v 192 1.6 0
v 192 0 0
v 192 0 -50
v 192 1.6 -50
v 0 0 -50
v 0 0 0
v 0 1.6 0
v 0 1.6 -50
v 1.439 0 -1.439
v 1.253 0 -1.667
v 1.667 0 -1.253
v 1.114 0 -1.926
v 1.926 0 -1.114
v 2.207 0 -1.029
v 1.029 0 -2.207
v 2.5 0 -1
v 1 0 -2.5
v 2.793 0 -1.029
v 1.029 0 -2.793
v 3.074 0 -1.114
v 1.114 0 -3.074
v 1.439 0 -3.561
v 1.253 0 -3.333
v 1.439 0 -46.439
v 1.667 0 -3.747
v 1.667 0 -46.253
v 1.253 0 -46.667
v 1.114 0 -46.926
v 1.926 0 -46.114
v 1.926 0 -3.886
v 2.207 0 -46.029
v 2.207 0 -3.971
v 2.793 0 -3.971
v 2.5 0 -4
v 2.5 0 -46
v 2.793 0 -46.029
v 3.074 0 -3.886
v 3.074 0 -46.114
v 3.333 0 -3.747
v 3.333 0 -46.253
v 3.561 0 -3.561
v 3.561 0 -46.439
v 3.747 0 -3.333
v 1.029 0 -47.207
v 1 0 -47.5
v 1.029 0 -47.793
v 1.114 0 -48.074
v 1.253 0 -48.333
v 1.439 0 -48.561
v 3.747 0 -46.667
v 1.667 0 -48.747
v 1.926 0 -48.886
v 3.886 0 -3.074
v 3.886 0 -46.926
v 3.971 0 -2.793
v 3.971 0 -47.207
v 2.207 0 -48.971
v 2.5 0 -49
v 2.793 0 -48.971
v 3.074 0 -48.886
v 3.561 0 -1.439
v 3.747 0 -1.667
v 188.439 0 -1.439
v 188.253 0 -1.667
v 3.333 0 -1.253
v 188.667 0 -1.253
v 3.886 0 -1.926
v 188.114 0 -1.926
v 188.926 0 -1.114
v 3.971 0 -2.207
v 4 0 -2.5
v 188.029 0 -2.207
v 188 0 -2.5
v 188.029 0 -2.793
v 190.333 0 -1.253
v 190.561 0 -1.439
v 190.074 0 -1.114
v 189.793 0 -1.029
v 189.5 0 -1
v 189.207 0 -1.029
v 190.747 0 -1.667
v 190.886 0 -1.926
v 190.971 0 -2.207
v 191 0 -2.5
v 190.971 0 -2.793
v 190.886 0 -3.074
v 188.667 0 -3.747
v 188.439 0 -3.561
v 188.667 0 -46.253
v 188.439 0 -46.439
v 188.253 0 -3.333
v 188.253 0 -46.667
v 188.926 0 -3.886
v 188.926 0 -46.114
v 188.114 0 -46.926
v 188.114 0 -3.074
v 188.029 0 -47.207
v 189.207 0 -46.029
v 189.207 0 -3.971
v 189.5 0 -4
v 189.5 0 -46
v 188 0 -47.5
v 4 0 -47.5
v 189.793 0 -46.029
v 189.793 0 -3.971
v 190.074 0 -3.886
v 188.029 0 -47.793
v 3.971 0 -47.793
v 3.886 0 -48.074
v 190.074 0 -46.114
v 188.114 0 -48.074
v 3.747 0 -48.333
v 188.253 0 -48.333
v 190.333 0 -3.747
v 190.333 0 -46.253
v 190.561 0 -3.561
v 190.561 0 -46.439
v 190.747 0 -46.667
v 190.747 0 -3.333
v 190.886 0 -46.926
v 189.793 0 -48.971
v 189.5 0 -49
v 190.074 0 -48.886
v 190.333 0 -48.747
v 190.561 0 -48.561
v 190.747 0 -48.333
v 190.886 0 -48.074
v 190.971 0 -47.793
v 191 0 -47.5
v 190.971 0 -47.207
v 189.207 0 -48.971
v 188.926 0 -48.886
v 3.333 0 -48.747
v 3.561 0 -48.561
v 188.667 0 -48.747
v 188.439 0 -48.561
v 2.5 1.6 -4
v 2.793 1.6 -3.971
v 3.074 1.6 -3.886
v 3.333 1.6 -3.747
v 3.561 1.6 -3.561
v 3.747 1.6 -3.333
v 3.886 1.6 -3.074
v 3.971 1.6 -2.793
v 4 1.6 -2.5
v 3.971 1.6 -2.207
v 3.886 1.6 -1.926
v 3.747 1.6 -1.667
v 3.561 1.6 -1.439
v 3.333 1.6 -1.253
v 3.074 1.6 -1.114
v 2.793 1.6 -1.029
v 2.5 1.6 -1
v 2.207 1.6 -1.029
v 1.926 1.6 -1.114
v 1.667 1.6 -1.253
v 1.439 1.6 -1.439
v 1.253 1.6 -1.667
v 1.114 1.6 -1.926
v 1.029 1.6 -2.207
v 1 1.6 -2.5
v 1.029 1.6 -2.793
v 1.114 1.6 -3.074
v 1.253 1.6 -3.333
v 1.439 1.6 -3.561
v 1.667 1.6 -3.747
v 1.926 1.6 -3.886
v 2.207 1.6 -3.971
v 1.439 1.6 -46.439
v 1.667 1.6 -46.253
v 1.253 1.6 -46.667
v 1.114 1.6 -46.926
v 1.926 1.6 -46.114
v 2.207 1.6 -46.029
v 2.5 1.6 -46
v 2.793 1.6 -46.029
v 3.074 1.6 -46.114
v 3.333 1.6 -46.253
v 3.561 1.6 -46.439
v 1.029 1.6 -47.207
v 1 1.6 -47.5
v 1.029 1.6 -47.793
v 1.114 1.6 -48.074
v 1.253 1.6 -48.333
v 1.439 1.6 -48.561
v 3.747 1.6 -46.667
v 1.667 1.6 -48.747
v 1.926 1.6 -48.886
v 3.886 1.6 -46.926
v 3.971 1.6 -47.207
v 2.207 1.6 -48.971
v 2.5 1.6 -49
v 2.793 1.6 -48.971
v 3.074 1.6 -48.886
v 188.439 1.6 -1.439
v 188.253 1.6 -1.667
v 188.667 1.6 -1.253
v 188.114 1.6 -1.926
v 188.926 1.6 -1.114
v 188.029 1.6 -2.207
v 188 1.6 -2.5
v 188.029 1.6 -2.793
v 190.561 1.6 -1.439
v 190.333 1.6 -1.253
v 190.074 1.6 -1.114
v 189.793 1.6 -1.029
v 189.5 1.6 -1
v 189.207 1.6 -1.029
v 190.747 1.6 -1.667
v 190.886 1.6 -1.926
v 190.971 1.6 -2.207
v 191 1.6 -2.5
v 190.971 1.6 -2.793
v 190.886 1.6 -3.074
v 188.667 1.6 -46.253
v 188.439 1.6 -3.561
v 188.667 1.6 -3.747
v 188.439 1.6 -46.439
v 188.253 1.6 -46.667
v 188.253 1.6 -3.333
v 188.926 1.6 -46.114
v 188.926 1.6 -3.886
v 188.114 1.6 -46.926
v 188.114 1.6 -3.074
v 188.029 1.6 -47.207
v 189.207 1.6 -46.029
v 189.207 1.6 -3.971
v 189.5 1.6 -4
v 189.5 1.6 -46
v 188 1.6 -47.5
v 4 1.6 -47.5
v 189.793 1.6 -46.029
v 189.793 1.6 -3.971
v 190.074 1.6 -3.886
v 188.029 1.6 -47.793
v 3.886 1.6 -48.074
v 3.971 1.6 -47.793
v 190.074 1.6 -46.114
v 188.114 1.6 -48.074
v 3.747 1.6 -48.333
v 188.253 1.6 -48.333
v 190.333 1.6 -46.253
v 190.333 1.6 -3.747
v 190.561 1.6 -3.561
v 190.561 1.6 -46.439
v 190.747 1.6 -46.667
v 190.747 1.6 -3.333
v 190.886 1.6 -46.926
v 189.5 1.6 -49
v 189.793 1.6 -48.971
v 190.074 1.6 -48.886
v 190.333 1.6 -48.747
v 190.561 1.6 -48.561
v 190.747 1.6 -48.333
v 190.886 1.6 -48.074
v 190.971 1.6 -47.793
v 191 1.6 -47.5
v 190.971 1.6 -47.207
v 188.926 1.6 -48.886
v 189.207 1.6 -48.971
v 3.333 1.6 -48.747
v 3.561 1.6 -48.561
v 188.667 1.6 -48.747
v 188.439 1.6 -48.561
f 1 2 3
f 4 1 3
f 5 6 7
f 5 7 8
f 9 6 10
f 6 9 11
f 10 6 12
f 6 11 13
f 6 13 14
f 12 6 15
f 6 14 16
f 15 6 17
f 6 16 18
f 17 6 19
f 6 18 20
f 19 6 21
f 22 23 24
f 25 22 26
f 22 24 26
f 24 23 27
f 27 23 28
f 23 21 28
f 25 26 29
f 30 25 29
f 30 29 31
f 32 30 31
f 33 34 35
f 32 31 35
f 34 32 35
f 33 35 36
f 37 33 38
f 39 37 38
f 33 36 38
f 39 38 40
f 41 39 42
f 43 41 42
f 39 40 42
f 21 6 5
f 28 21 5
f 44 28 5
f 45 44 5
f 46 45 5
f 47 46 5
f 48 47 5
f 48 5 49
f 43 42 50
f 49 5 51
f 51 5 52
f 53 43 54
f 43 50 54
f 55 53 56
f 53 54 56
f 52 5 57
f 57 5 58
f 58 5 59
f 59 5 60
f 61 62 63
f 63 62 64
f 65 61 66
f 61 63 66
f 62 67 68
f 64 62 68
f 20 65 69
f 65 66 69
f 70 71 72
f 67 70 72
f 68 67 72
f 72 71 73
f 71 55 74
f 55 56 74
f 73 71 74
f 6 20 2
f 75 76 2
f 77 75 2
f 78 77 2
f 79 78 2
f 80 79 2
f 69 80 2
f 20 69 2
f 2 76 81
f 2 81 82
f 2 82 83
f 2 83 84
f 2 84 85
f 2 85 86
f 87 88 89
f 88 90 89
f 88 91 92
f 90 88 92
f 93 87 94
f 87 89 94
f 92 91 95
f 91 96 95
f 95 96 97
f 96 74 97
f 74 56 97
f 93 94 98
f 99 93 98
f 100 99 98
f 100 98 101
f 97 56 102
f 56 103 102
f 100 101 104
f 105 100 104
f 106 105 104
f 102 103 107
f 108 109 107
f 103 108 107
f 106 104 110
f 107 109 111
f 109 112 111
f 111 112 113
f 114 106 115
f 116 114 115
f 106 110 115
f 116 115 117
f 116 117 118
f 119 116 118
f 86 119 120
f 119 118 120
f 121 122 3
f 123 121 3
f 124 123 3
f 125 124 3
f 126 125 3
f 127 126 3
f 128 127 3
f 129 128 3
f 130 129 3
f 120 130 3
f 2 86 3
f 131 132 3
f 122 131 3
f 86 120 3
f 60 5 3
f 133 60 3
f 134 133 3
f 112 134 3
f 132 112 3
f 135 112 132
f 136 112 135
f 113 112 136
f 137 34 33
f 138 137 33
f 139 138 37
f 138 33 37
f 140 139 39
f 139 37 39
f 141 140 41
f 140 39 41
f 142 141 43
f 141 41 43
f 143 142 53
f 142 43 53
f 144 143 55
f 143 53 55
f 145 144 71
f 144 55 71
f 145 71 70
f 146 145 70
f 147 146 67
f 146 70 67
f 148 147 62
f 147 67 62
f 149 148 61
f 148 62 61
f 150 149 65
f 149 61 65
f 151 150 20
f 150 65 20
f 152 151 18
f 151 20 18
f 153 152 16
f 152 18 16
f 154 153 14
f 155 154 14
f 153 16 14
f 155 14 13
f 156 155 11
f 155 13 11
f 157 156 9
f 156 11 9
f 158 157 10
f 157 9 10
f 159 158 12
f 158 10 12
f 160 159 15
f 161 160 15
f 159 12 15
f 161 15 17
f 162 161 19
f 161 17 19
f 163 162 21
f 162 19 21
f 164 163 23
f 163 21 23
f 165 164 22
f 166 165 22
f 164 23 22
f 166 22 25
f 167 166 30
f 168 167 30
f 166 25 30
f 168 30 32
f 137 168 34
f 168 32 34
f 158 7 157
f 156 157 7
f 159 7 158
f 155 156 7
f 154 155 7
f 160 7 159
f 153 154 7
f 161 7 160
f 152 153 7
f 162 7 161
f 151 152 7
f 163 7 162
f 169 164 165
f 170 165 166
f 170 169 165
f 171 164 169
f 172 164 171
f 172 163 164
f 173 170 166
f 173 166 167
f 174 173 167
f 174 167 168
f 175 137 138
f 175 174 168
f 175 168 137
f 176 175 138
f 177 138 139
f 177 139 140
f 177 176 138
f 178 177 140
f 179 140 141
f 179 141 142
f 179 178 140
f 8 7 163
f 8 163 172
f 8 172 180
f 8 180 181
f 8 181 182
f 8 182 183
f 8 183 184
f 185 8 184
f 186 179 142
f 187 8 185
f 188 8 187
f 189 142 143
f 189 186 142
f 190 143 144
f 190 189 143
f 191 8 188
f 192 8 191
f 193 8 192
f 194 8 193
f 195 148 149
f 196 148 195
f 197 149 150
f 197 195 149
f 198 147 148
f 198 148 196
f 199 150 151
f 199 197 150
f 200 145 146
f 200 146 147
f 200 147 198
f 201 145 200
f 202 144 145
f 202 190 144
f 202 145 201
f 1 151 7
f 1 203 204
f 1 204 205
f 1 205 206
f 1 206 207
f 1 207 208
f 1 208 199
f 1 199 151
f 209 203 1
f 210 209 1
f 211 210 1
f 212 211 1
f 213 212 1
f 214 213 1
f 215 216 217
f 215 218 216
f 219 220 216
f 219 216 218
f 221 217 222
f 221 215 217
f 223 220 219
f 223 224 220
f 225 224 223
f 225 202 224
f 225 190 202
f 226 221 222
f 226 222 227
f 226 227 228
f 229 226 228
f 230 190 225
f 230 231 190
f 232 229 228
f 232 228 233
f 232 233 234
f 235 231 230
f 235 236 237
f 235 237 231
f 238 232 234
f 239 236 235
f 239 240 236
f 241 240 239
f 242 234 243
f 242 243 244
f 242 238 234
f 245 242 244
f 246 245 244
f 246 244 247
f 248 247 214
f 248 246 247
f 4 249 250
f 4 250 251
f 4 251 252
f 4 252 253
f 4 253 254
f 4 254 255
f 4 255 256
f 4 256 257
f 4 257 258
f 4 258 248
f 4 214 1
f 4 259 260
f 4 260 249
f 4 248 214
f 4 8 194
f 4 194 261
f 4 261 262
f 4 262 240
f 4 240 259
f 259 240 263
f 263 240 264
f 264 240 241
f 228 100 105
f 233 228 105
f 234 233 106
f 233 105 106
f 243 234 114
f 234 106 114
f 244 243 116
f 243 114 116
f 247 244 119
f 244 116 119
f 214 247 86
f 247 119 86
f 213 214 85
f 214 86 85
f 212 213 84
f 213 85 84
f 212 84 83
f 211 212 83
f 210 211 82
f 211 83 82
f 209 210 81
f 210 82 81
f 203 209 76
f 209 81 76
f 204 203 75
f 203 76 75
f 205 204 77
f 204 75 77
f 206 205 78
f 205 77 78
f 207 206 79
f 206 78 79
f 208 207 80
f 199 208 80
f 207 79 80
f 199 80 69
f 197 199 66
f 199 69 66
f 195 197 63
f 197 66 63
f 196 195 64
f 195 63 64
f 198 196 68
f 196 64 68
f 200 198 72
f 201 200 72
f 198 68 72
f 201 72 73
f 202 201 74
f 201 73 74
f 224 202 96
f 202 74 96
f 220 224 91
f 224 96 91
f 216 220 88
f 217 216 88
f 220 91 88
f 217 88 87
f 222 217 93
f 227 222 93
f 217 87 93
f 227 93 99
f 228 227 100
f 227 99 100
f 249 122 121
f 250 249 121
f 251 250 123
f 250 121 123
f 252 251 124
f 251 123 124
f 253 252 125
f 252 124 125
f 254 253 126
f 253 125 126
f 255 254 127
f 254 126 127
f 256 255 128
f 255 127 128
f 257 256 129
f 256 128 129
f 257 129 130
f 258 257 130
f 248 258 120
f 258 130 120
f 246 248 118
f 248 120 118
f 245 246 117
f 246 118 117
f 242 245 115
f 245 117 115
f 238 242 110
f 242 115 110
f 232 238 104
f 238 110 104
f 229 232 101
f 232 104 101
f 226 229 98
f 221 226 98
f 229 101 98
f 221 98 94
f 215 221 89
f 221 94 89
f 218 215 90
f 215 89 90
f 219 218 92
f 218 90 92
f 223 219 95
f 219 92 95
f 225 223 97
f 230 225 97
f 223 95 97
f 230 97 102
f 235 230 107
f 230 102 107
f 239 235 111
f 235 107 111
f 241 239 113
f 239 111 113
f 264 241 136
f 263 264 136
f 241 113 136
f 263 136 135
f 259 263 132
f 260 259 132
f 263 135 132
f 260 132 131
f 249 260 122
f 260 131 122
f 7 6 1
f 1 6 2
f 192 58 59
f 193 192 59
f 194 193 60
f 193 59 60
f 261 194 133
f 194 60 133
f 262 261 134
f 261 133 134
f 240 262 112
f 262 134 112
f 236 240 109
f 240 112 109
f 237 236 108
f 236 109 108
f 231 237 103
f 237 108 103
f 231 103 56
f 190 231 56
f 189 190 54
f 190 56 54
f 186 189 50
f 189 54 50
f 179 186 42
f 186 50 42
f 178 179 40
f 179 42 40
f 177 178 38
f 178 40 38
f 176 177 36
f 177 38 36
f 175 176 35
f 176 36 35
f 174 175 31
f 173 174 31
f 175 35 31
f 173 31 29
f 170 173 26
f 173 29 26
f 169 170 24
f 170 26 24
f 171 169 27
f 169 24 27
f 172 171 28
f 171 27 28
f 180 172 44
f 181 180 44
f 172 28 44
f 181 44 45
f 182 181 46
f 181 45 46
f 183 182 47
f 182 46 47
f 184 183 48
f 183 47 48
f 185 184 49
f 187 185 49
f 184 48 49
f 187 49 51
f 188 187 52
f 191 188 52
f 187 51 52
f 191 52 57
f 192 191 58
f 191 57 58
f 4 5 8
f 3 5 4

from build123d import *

# Parameters (mm, degrees)
SKETCH1_W           = 192
SKETCH1_H           = 50
BOSS_EXTRUDE1_DEPTH = 1.6
SKETCH2_R           = 1.5
CUT_EXTRUDE1_DEPTH  = 1.6


with BuildPart() as part:
    # Sketch1 → Boss-Extrude1 (new body)
    with BuildSketch(Plane(origin=(0, 0, 0), x_dir=(1, 0, 0), z_dir=(0, 1, 0))):
        with Locations((96, 25)):
            Rectangle(SKETCH1_W, SKETCH1_H)
    extrude(amount=BOSS_EXTRUDE1_DEPTH)

    # Sketch2 → Cut-Extrude1 (cut)
    with BuildSketch(Plane.XZ):
        with Locations(Location((2.5, -2.5, 0), (0, 0, 270))):
            Circle(SKETCH2_R)
        with Locations(Location((189.5, -2.5, 0), (0, 0, 270))):
            Circle(SKETCH2_R)
        with Locations(Location((189.5, -47.5, 0), (0, 0, 270))):
            Circle(SKETCH2_R)
        with Locations(Location((2.5, -47.5, 0), (0, 0, 270))):
            Circle(SKETCH2_R)
    extrude(amount=-CUT_EXTRUDE1_DEPTH, mode=Mode.SUBTRACT)


solid = part.part
